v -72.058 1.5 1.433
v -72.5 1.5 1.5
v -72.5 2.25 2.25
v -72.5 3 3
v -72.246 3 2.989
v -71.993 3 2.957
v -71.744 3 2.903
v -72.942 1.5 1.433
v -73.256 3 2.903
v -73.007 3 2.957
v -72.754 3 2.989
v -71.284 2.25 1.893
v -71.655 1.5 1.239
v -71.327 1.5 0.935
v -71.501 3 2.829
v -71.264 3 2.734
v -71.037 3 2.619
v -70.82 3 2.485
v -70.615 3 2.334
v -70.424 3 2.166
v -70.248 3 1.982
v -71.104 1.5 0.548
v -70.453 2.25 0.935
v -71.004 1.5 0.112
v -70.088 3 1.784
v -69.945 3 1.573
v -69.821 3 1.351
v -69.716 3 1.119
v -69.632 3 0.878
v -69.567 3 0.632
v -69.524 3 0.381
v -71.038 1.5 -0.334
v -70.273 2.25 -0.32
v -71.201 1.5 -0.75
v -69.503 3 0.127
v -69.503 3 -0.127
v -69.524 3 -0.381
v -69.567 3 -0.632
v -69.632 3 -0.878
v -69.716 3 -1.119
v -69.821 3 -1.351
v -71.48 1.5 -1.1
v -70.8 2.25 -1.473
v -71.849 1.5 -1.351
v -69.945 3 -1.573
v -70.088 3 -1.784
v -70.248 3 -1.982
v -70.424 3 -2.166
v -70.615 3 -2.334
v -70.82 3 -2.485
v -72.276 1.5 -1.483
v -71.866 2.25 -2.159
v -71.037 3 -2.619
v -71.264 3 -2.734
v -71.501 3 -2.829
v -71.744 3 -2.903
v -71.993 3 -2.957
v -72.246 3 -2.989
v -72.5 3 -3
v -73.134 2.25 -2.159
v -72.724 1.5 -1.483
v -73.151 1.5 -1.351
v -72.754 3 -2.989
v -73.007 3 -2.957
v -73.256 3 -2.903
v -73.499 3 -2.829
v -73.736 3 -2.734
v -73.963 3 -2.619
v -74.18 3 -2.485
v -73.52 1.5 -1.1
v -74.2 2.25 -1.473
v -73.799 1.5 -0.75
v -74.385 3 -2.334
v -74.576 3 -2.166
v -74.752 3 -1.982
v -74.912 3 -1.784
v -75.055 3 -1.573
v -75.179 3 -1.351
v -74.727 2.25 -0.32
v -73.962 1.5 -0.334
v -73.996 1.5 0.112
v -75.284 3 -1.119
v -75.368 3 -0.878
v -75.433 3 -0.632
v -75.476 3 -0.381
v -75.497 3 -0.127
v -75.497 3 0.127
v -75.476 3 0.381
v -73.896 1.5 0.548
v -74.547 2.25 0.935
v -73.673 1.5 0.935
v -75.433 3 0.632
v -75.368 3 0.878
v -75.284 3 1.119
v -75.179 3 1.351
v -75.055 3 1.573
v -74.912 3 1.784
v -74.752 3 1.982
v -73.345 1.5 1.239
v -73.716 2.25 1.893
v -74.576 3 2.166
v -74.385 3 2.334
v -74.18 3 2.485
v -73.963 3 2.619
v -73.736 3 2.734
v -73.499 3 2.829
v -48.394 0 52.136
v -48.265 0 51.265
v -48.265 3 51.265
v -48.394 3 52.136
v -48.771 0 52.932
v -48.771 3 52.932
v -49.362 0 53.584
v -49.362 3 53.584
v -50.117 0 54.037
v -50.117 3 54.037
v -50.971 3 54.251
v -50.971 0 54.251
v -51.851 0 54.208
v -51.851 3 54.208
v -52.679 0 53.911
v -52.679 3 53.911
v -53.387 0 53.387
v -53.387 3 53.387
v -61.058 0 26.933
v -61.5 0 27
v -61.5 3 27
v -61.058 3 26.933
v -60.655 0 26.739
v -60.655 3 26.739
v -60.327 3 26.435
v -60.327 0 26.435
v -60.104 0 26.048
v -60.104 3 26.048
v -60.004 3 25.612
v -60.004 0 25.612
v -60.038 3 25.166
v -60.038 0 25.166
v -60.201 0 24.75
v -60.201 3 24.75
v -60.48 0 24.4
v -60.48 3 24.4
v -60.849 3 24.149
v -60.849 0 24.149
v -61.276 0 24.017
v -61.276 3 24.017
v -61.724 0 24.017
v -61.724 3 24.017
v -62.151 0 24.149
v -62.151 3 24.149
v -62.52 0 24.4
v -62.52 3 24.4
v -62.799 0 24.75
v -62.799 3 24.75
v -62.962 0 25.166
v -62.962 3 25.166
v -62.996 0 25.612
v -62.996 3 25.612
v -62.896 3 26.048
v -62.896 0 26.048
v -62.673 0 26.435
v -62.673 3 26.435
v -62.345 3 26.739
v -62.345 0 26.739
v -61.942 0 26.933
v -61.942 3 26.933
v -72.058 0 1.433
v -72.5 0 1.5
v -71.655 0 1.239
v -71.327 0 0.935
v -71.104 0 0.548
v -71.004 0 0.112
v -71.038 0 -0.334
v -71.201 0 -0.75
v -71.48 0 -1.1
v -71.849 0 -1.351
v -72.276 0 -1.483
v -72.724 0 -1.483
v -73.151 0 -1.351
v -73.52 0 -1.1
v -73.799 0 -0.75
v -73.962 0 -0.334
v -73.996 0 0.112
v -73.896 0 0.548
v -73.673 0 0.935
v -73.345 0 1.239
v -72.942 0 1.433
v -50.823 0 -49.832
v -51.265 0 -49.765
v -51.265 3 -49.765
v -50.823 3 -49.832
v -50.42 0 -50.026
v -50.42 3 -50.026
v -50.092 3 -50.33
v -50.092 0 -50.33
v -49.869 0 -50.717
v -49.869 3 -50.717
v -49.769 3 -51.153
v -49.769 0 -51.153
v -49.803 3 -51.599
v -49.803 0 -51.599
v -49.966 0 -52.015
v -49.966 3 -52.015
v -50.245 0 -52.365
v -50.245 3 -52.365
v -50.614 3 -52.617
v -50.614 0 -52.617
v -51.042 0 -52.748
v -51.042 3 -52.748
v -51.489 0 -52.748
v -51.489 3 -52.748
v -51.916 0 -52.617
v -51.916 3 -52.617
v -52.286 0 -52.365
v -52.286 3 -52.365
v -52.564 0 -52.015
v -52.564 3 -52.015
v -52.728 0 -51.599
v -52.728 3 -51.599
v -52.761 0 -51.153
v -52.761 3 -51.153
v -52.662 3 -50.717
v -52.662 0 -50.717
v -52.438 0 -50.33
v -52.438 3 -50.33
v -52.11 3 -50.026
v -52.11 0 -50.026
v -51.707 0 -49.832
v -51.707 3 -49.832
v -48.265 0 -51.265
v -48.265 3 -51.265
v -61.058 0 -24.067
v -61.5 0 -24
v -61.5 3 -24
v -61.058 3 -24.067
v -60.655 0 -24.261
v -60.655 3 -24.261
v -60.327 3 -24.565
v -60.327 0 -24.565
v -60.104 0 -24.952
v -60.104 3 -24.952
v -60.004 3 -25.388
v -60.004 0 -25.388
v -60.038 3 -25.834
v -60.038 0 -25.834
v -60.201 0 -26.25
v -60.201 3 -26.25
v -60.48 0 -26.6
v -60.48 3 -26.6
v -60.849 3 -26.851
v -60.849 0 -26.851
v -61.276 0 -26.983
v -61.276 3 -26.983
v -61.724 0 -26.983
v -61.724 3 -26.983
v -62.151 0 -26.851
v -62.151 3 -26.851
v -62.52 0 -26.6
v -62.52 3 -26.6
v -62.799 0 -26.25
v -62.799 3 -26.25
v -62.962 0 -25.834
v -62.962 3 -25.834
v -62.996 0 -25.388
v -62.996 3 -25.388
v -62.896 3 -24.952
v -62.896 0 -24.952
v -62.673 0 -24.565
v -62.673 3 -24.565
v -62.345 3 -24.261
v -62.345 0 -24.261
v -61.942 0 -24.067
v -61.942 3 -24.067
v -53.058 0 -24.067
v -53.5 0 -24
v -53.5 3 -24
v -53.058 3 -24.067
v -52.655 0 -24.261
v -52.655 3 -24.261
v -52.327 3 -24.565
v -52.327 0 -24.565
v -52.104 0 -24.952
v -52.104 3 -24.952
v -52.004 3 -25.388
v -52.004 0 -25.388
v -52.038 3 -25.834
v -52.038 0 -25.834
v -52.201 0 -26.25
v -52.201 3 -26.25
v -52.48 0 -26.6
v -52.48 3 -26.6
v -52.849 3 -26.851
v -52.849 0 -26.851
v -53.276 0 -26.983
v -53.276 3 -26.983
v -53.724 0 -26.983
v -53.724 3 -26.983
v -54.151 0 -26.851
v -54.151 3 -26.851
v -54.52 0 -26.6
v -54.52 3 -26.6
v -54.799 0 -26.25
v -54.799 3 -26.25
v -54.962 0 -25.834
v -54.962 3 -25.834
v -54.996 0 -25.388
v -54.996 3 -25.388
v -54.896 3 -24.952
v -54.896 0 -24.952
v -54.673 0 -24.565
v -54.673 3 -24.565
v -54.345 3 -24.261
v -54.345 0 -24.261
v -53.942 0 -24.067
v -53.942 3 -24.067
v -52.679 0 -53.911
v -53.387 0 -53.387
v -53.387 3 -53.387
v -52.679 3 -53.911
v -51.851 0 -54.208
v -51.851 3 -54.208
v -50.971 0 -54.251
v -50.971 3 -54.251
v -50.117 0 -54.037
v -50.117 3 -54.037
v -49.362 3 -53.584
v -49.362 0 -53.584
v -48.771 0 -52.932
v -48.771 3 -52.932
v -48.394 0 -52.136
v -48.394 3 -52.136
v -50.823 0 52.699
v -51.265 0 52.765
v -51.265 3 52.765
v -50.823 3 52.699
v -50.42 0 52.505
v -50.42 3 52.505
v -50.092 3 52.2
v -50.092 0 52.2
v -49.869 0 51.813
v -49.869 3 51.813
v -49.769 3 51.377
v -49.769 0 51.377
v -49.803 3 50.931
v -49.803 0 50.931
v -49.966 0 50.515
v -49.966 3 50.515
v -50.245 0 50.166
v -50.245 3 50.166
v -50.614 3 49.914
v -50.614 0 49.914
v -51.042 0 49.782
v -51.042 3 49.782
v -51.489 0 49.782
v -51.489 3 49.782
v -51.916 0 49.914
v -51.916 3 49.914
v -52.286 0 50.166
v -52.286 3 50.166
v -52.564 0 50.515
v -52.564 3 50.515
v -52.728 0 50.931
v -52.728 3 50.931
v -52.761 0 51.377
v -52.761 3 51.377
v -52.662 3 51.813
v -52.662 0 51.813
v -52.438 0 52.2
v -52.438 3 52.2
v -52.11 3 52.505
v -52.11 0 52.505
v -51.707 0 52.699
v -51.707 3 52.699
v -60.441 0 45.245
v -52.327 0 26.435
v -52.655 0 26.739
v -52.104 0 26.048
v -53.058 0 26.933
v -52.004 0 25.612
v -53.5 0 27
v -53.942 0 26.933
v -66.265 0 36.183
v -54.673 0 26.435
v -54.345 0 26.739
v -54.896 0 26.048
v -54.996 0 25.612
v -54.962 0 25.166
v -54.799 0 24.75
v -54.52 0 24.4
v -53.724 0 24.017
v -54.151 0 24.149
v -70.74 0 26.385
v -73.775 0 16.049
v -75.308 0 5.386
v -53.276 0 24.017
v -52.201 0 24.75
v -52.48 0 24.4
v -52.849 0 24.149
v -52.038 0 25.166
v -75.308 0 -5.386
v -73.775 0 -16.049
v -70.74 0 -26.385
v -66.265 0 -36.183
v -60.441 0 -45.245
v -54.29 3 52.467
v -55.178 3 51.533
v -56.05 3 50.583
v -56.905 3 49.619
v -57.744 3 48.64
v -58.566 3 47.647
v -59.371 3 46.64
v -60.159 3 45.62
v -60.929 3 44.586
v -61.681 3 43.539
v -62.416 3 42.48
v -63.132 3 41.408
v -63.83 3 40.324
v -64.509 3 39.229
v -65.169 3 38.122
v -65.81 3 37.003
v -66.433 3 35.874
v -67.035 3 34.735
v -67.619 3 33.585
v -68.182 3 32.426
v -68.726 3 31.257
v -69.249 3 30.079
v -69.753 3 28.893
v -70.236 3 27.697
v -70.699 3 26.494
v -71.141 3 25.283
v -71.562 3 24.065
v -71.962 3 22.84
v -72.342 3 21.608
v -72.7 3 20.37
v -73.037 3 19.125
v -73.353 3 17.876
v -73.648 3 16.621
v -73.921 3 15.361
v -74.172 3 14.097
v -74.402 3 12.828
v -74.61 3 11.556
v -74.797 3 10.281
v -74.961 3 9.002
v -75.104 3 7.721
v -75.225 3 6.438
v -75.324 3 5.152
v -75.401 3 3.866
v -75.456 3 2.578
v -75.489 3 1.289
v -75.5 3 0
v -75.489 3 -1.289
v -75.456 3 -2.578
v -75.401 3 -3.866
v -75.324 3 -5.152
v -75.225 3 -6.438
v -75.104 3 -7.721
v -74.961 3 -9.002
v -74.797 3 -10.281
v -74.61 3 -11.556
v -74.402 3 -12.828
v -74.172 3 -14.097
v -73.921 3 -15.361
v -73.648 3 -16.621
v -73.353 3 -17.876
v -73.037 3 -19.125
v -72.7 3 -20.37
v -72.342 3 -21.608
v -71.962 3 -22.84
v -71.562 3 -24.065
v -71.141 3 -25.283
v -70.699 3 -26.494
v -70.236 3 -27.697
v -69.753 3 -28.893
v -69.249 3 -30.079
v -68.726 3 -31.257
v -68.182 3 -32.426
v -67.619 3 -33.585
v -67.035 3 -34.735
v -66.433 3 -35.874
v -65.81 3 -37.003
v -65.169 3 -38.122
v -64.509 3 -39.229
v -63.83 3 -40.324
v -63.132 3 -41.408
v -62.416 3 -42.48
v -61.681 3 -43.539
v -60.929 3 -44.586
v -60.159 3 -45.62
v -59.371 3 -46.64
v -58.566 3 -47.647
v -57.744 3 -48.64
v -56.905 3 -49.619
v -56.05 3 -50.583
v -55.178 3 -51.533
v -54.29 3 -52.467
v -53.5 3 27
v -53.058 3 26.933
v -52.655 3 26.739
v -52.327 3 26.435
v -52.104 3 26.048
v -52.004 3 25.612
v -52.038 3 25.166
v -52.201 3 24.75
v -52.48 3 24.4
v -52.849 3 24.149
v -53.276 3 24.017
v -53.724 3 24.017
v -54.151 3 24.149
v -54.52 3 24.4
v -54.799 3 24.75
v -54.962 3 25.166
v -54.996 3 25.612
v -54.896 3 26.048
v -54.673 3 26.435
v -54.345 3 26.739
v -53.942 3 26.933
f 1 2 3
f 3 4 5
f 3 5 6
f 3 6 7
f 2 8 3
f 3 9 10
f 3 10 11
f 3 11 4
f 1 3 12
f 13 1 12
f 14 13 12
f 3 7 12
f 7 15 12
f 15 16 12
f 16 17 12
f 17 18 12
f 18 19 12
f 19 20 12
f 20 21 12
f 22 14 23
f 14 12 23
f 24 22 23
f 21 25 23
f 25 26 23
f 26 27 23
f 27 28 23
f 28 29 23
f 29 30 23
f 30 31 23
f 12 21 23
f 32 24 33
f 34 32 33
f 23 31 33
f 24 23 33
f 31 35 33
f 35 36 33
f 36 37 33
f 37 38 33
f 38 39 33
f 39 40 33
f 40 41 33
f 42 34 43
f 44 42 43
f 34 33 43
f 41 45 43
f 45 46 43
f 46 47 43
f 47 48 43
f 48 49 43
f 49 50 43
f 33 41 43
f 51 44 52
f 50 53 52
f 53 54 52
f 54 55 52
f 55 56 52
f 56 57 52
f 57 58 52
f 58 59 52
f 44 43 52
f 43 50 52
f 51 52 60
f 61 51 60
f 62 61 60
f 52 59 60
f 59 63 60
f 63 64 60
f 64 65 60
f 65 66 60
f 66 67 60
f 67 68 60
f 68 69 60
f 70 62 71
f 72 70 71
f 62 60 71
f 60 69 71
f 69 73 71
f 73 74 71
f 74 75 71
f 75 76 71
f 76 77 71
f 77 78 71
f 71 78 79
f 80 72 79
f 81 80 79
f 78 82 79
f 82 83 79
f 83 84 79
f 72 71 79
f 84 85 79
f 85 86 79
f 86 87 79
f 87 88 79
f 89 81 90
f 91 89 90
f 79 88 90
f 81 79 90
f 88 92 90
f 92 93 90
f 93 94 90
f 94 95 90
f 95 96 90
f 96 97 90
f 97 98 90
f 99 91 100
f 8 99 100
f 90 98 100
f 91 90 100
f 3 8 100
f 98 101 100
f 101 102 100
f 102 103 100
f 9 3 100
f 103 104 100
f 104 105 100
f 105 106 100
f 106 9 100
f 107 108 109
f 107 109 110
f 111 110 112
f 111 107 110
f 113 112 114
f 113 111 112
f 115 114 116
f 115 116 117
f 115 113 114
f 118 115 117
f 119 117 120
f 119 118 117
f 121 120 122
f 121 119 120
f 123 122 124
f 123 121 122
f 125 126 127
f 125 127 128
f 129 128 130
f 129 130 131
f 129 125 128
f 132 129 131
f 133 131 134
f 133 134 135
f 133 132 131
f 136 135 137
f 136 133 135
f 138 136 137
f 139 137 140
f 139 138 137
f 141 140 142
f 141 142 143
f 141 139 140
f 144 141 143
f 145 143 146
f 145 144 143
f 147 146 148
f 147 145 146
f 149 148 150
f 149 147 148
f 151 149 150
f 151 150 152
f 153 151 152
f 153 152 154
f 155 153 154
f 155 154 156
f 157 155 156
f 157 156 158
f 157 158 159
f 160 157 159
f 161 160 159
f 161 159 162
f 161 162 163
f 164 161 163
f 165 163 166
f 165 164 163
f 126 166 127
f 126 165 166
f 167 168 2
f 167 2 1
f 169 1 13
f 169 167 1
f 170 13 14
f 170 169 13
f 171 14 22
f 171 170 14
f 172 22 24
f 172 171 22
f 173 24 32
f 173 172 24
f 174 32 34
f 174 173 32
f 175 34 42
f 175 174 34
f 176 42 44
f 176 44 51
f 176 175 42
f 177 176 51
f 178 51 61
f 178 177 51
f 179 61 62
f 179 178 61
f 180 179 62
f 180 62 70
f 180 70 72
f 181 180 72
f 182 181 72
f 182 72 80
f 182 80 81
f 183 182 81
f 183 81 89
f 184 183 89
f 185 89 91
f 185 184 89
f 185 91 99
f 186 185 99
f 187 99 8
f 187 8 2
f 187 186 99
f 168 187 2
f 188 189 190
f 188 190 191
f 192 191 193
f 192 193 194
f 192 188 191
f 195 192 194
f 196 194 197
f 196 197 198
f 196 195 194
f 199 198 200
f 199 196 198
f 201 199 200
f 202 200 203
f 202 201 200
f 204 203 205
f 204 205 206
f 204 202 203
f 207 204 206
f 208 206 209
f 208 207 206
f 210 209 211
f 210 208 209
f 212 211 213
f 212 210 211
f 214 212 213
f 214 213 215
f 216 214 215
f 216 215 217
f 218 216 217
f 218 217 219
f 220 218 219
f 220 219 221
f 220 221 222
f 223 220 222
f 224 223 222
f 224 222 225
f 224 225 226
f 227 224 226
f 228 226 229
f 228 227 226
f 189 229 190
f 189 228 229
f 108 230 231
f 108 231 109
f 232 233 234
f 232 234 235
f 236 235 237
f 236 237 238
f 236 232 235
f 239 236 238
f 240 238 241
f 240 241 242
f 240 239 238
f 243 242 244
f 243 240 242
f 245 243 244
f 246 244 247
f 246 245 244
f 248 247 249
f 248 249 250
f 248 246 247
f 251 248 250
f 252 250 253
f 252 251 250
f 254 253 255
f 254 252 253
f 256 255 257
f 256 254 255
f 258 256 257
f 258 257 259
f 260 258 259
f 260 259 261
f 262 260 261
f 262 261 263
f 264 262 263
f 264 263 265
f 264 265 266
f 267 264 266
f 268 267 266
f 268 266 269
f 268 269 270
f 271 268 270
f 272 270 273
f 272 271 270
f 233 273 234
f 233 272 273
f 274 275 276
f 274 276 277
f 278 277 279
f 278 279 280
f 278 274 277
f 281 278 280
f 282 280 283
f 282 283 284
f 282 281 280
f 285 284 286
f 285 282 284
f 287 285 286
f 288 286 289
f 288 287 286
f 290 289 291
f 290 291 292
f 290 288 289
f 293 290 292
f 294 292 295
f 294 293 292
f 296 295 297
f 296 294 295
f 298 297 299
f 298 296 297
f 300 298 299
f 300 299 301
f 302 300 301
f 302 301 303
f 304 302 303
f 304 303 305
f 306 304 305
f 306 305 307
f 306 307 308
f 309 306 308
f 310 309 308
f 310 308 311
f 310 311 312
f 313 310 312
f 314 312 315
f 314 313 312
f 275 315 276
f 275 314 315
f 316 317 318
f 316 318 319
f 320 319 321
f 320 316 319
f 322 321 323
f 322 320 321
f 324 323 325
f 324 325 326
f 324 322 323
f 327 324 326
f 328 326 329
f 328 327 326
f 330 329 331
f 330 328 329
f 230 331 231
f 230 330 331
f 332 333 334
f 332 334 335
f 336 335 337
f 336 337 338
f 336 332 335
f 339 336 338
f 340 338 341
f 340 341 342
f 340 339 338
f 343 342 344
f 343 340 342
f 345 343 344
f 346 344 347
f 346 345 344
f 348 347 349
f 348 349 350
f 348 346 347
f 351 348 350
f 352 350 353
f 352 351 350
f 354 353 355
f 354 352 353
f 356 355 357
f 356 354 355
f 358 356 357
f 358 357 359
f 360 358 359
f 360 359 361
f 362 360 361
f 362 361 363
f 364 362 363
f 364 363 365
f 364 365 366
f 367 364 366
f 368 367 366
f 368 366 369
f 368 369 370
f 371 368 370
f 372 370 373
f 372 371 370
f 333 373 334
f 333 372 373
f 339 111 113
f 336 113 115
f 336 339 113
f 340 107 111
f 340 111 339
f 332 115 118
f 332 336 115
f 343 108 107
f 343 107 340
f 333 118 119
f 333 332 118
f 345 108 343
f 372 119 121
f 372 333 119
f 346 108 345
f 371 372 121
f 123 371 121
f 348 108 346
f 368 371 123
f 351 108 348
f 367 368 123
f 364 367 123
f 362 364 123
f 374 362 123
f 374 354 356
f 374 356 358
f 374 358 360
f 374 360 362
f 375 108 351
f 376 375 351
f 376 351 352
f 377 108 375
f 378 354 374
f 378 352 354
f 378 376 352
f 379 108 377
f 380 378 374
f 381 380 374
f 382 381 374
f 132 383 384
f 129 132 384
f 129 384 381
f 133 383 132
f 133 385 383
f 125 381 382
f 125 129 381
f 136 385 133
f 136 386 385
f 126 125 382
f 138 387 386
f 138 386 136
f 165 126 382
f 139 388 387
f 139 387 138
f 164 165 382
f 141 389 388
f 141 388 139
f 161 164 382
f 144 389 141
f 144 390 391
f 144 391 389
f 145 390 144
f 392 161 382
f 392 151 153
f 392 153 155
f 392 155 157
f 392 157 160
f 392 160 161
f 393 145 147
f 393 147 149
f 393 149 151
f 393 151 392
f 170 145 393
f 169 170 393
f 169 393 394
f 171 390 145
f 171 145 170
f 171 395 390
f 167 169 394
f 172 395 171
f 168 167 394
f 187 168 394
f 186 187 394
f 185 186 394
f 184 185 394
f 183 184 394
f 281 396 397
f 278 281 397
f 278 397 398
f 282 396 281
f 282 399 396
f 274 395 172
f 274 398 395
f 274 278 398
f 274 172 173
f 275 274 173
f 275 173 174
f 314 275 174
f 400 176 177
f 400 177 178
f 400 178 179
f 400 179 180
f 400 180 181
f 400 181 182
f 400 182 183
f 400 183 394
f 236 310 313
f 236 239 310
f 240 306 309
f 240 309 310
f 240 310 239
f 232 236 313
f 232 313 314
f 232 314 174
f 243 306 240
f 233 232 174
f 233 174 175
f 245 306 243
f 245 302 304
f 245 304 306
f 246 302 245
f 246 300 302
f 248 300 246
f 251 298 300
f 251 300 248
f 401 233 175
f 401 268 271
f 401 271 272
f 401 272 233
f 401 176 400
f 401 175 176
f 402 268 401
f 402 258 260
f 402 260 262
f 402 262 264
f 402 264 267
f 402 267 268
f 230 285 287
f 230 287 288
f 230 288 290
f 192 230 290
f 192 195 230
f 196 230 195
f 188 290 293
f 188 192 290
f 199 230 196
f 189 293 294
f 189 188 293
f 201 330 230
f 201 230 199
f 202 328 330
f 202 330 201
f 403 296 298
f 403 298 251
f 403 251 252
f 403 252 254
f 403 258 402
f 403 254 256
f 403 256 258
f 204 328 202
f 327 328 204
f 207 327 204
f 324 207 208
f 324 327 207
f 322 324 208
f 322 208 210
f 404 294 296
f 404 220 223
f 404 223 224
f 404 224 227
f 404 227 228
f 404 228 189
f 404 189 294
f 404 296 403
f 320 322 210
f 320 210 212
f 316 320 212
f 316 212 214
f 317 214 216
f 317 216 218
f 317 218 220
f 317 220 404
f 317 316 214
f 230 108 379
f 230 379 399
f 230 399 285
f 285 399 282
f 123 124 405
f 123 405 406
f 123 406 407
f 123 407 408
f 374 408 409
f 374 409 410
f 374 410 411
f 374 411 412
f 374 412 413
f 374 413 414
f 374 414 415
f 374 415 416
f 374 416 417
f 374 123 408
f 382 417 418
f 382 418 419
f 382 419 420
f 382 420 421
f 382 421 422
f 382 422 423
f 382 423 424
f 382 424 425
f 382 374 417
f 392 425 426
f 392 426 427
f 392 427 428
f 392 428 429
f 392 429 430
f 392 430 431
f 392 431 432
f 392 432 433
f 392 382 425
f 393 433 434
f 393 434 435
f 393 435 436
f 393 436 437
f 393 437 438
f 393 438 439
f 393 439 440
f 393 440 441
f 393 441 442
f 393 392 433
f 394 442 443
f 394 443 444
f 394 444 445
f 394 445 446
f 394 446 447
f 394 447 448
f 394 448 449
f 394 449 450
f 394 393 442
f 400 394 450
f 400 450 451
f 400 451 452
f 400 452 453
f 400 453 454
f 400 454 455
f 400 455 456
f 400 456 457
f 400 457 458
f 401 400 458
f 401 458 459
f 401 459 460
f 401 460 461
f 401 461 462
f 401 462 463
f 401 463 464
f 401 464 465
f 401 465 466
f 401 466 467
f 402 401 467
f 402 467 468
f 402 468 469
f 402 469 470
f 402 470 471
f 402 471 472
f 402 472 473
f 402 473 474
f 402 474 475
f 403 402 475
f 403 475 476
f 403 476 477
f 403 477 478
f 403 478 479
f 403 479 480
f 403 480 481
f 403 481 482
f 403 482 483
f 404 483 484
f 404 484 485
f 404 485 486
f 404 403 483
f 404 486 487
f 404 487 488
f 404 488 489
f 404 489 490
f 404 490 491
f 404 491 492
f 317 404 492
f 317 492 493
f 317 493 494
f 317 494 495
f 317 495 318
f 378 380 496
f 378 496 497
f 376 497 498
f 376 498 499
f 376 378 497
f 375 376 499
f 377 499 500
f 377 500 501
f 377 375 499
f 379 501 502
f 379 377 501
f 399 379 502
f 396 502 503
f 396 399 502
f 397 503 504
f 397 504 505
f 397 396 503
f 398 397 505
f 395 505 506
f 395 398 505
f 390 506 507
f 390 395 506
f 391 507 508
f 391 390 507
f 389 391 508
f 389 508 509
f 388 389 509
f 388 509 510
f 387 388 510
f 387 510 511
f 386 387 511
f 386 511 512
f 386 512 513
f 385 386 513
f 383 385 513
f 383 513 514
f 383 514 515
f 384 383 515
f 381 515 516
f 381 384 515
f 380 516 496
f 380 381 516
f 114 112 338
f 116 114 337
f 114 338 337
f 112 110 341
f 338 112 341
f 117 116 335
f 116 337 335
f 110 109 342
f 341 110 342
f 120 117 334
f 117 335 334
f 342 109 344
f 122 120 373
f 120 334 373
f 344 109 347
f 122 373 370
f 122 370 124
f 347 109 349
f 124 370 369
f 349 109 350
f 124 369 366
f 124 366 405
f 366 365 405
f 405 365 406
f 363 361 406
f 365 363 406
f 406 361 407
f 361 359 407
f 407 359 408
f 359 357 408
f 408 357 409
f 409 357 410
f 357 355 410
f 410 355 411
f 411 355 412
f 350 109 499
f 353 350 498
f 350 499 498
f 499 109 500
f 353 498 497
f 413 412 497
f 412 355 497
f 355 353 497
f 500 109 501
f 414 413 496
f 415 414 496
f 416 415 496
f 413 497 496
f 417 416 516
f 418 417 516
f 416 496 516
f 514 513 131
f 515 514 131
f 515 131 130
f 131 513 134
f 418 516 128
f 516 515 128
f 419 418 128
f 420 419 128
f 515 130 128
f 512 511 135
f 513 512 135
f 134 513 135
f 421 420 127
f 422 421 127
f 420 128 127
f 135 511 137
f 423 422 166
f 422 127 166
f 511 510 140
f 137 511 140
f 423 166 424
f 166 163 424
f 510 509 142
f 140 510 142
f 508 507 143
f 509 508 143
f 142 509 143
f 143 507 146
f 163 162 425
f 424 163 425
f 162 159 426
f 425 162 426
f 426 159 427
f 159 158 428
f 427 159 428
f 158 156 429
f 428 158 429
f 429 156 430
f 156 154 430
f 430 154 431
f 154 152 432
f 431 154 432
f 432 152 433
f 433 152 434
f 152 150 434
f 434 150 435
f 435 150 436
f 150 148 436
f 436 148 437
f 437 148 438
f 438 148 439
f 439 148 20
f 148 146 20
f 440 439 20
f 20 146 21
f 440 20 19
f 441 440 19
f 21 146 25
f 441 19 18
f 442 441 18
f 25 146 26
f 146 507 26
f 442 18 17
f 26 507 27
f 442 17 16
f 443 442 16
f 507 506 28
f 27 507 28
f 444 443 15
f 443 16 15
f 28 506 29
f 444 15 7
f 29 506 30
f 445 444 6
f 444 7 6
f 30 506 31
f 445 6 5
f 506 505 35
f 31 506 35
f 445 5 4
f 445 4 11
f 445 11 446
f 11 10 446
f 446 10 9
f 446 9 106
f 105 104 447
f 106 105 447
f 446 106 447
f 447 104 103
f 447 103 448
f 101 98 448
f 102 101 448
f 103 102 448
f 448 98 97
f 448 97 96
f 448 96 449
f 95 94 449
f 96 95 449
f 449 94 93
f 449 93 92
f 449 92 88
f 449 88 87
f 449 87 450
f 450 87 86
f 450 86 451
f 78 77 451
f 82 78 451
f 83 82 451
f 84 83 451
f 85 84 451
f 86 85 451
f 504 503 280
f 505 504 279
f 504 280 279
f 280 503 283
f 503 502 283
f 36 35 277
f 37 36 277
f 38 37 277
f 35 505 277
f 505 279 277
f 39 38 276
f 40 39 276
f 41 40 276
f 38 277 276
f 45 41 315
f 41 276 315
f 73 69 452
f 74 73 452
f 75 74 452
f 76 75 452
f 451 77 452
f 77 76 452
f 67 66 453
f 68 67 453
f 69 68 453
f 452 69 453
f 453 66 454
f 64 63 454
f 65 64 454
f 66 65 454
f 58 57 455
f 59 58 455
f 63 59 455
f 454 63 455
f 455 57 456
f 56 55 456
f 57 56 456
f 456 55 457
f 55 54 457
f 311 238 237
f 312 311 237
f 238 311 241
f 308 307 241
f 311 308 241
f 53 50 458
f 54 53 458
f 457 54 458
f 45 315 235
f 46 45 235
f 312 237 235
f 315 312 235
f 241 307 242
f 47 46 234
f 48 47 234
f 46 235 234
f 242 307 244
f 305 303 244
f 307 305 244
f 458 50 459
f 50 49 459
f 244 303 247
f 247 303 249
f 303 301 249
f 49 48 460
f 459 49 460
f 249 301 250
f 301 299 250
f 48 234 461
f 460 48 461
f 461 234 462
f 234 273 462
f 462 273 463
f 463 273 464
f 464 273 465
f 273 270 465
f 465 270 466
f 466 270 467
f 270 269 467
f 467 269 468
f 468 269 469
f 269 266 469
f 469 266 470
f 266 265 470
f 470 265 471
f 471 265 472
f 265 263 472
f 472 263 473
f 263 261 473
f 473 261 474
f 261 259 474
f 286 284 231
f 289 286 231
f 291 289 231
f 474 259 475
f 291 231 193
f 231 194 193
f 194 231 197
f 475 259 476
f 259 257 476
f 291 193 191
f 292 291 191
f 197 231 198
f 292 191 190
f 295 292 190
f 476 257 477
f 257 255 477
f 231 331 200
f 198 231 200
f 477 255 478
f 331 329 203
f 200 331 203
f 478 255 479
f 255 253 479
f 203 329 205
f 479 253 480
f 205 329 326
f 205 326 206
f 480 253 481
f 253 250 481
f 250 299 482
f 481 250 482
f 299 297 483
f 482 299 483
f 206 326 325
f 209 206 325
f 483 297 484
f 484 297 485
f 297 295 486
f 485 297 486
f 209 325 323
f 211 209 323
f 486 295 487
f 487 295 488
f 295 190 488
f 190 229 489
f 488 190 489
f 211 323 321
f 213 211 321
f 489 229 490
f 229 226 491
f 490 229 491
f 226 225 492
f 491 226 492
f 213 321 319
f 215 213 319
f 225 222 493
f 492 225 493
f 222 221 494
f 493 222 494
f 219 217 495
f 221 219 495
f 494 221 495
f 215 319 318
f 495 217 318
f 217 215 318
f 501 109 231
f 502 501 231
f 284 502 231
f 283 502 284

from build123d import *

# Parameters (mm, degrees)
SKETCH_1_R      = 1.5
EXTRUDE_1_DEPTH = 3
CHAMFER_1_SIZE  = 1.5


with BuildPart() as part:
    # 草图1 → 凸台-拉伸1 (new body)
    with BuildSketch(Plane(origin=(0, 0, 0), x_dir=(1, 0, 0), z_dir=(0, 1, 0))):
        with BuildLine():
            Line((-48.265241636, 51.265241636), (-48.265241636, -51.265241636))
            ThreePointArc((-48.265241636, -51.265241636), (-50.117191339, -54.036880234), (-53.38656198, -53.38656198))
            ThreePointArc((-53.38656198, -53.38656198), (-75.5, 0), (-53.38656198, 53.38656198))
            ThreePointArc((-53.38656198, 53.38656198), (-50.117191339, 54.036880234), (-48.265241636, 51.265241636))
        make_face()
        with Locations(Location((-51.265241636, -51.265241636, 0), (0, 0, 270))):
            Circle(SKETCH_1_R, mode=Mode.SUBTRACT)
        with Locations(Location((-72.5, 0, 0), (0, 0, 270))):
            Circle(SKETCH_1_R, mode=Mode.SUBTRACT)
        with Locations(Location((-51.265241636, 51.265241636, 0), (0, 0, 270))):
            Circle(SKETCH_1_R, mode=Mode.SUBTRACT)
        with Locations(Location((-61.499999084, -25.5, 0), (0, 0, 270))):
            Circle(SKETCH_1_R, mode=Mode.SUBTRACT)
        with Locations(Location((-53.499999084, -25.5, 0), (0, 0, 270))):
            Circle(SKETCH_1_R, mode=Mode.SUBTRACT)
        with Locations(Location((-61.499999084, 25.5, 0), (0, 0, 270))):
            Circle(SKETCH_1_R, mode=Mode.SUBTRACT)
        with Locations(Location((-53.499999084, 25.5, 0), (0, 0, 270))):
            Circle(SKETCH_1_R, mode=Mode.SUBTRACT)
    extrude(amount=EXTRUDE_1_DEPTH)

    # 倒角1
    chamfer_1_edges = [part.edges().sort_by_distance(p)[0] for p in [
        (-72.5, 3, -1.5),
    ]]
    chamfer(chamfer_1_edges, length=CHAMFER_1_SIZE - 0.0001)  # a hair under: the kernel refuses the full size


solid = part.part
